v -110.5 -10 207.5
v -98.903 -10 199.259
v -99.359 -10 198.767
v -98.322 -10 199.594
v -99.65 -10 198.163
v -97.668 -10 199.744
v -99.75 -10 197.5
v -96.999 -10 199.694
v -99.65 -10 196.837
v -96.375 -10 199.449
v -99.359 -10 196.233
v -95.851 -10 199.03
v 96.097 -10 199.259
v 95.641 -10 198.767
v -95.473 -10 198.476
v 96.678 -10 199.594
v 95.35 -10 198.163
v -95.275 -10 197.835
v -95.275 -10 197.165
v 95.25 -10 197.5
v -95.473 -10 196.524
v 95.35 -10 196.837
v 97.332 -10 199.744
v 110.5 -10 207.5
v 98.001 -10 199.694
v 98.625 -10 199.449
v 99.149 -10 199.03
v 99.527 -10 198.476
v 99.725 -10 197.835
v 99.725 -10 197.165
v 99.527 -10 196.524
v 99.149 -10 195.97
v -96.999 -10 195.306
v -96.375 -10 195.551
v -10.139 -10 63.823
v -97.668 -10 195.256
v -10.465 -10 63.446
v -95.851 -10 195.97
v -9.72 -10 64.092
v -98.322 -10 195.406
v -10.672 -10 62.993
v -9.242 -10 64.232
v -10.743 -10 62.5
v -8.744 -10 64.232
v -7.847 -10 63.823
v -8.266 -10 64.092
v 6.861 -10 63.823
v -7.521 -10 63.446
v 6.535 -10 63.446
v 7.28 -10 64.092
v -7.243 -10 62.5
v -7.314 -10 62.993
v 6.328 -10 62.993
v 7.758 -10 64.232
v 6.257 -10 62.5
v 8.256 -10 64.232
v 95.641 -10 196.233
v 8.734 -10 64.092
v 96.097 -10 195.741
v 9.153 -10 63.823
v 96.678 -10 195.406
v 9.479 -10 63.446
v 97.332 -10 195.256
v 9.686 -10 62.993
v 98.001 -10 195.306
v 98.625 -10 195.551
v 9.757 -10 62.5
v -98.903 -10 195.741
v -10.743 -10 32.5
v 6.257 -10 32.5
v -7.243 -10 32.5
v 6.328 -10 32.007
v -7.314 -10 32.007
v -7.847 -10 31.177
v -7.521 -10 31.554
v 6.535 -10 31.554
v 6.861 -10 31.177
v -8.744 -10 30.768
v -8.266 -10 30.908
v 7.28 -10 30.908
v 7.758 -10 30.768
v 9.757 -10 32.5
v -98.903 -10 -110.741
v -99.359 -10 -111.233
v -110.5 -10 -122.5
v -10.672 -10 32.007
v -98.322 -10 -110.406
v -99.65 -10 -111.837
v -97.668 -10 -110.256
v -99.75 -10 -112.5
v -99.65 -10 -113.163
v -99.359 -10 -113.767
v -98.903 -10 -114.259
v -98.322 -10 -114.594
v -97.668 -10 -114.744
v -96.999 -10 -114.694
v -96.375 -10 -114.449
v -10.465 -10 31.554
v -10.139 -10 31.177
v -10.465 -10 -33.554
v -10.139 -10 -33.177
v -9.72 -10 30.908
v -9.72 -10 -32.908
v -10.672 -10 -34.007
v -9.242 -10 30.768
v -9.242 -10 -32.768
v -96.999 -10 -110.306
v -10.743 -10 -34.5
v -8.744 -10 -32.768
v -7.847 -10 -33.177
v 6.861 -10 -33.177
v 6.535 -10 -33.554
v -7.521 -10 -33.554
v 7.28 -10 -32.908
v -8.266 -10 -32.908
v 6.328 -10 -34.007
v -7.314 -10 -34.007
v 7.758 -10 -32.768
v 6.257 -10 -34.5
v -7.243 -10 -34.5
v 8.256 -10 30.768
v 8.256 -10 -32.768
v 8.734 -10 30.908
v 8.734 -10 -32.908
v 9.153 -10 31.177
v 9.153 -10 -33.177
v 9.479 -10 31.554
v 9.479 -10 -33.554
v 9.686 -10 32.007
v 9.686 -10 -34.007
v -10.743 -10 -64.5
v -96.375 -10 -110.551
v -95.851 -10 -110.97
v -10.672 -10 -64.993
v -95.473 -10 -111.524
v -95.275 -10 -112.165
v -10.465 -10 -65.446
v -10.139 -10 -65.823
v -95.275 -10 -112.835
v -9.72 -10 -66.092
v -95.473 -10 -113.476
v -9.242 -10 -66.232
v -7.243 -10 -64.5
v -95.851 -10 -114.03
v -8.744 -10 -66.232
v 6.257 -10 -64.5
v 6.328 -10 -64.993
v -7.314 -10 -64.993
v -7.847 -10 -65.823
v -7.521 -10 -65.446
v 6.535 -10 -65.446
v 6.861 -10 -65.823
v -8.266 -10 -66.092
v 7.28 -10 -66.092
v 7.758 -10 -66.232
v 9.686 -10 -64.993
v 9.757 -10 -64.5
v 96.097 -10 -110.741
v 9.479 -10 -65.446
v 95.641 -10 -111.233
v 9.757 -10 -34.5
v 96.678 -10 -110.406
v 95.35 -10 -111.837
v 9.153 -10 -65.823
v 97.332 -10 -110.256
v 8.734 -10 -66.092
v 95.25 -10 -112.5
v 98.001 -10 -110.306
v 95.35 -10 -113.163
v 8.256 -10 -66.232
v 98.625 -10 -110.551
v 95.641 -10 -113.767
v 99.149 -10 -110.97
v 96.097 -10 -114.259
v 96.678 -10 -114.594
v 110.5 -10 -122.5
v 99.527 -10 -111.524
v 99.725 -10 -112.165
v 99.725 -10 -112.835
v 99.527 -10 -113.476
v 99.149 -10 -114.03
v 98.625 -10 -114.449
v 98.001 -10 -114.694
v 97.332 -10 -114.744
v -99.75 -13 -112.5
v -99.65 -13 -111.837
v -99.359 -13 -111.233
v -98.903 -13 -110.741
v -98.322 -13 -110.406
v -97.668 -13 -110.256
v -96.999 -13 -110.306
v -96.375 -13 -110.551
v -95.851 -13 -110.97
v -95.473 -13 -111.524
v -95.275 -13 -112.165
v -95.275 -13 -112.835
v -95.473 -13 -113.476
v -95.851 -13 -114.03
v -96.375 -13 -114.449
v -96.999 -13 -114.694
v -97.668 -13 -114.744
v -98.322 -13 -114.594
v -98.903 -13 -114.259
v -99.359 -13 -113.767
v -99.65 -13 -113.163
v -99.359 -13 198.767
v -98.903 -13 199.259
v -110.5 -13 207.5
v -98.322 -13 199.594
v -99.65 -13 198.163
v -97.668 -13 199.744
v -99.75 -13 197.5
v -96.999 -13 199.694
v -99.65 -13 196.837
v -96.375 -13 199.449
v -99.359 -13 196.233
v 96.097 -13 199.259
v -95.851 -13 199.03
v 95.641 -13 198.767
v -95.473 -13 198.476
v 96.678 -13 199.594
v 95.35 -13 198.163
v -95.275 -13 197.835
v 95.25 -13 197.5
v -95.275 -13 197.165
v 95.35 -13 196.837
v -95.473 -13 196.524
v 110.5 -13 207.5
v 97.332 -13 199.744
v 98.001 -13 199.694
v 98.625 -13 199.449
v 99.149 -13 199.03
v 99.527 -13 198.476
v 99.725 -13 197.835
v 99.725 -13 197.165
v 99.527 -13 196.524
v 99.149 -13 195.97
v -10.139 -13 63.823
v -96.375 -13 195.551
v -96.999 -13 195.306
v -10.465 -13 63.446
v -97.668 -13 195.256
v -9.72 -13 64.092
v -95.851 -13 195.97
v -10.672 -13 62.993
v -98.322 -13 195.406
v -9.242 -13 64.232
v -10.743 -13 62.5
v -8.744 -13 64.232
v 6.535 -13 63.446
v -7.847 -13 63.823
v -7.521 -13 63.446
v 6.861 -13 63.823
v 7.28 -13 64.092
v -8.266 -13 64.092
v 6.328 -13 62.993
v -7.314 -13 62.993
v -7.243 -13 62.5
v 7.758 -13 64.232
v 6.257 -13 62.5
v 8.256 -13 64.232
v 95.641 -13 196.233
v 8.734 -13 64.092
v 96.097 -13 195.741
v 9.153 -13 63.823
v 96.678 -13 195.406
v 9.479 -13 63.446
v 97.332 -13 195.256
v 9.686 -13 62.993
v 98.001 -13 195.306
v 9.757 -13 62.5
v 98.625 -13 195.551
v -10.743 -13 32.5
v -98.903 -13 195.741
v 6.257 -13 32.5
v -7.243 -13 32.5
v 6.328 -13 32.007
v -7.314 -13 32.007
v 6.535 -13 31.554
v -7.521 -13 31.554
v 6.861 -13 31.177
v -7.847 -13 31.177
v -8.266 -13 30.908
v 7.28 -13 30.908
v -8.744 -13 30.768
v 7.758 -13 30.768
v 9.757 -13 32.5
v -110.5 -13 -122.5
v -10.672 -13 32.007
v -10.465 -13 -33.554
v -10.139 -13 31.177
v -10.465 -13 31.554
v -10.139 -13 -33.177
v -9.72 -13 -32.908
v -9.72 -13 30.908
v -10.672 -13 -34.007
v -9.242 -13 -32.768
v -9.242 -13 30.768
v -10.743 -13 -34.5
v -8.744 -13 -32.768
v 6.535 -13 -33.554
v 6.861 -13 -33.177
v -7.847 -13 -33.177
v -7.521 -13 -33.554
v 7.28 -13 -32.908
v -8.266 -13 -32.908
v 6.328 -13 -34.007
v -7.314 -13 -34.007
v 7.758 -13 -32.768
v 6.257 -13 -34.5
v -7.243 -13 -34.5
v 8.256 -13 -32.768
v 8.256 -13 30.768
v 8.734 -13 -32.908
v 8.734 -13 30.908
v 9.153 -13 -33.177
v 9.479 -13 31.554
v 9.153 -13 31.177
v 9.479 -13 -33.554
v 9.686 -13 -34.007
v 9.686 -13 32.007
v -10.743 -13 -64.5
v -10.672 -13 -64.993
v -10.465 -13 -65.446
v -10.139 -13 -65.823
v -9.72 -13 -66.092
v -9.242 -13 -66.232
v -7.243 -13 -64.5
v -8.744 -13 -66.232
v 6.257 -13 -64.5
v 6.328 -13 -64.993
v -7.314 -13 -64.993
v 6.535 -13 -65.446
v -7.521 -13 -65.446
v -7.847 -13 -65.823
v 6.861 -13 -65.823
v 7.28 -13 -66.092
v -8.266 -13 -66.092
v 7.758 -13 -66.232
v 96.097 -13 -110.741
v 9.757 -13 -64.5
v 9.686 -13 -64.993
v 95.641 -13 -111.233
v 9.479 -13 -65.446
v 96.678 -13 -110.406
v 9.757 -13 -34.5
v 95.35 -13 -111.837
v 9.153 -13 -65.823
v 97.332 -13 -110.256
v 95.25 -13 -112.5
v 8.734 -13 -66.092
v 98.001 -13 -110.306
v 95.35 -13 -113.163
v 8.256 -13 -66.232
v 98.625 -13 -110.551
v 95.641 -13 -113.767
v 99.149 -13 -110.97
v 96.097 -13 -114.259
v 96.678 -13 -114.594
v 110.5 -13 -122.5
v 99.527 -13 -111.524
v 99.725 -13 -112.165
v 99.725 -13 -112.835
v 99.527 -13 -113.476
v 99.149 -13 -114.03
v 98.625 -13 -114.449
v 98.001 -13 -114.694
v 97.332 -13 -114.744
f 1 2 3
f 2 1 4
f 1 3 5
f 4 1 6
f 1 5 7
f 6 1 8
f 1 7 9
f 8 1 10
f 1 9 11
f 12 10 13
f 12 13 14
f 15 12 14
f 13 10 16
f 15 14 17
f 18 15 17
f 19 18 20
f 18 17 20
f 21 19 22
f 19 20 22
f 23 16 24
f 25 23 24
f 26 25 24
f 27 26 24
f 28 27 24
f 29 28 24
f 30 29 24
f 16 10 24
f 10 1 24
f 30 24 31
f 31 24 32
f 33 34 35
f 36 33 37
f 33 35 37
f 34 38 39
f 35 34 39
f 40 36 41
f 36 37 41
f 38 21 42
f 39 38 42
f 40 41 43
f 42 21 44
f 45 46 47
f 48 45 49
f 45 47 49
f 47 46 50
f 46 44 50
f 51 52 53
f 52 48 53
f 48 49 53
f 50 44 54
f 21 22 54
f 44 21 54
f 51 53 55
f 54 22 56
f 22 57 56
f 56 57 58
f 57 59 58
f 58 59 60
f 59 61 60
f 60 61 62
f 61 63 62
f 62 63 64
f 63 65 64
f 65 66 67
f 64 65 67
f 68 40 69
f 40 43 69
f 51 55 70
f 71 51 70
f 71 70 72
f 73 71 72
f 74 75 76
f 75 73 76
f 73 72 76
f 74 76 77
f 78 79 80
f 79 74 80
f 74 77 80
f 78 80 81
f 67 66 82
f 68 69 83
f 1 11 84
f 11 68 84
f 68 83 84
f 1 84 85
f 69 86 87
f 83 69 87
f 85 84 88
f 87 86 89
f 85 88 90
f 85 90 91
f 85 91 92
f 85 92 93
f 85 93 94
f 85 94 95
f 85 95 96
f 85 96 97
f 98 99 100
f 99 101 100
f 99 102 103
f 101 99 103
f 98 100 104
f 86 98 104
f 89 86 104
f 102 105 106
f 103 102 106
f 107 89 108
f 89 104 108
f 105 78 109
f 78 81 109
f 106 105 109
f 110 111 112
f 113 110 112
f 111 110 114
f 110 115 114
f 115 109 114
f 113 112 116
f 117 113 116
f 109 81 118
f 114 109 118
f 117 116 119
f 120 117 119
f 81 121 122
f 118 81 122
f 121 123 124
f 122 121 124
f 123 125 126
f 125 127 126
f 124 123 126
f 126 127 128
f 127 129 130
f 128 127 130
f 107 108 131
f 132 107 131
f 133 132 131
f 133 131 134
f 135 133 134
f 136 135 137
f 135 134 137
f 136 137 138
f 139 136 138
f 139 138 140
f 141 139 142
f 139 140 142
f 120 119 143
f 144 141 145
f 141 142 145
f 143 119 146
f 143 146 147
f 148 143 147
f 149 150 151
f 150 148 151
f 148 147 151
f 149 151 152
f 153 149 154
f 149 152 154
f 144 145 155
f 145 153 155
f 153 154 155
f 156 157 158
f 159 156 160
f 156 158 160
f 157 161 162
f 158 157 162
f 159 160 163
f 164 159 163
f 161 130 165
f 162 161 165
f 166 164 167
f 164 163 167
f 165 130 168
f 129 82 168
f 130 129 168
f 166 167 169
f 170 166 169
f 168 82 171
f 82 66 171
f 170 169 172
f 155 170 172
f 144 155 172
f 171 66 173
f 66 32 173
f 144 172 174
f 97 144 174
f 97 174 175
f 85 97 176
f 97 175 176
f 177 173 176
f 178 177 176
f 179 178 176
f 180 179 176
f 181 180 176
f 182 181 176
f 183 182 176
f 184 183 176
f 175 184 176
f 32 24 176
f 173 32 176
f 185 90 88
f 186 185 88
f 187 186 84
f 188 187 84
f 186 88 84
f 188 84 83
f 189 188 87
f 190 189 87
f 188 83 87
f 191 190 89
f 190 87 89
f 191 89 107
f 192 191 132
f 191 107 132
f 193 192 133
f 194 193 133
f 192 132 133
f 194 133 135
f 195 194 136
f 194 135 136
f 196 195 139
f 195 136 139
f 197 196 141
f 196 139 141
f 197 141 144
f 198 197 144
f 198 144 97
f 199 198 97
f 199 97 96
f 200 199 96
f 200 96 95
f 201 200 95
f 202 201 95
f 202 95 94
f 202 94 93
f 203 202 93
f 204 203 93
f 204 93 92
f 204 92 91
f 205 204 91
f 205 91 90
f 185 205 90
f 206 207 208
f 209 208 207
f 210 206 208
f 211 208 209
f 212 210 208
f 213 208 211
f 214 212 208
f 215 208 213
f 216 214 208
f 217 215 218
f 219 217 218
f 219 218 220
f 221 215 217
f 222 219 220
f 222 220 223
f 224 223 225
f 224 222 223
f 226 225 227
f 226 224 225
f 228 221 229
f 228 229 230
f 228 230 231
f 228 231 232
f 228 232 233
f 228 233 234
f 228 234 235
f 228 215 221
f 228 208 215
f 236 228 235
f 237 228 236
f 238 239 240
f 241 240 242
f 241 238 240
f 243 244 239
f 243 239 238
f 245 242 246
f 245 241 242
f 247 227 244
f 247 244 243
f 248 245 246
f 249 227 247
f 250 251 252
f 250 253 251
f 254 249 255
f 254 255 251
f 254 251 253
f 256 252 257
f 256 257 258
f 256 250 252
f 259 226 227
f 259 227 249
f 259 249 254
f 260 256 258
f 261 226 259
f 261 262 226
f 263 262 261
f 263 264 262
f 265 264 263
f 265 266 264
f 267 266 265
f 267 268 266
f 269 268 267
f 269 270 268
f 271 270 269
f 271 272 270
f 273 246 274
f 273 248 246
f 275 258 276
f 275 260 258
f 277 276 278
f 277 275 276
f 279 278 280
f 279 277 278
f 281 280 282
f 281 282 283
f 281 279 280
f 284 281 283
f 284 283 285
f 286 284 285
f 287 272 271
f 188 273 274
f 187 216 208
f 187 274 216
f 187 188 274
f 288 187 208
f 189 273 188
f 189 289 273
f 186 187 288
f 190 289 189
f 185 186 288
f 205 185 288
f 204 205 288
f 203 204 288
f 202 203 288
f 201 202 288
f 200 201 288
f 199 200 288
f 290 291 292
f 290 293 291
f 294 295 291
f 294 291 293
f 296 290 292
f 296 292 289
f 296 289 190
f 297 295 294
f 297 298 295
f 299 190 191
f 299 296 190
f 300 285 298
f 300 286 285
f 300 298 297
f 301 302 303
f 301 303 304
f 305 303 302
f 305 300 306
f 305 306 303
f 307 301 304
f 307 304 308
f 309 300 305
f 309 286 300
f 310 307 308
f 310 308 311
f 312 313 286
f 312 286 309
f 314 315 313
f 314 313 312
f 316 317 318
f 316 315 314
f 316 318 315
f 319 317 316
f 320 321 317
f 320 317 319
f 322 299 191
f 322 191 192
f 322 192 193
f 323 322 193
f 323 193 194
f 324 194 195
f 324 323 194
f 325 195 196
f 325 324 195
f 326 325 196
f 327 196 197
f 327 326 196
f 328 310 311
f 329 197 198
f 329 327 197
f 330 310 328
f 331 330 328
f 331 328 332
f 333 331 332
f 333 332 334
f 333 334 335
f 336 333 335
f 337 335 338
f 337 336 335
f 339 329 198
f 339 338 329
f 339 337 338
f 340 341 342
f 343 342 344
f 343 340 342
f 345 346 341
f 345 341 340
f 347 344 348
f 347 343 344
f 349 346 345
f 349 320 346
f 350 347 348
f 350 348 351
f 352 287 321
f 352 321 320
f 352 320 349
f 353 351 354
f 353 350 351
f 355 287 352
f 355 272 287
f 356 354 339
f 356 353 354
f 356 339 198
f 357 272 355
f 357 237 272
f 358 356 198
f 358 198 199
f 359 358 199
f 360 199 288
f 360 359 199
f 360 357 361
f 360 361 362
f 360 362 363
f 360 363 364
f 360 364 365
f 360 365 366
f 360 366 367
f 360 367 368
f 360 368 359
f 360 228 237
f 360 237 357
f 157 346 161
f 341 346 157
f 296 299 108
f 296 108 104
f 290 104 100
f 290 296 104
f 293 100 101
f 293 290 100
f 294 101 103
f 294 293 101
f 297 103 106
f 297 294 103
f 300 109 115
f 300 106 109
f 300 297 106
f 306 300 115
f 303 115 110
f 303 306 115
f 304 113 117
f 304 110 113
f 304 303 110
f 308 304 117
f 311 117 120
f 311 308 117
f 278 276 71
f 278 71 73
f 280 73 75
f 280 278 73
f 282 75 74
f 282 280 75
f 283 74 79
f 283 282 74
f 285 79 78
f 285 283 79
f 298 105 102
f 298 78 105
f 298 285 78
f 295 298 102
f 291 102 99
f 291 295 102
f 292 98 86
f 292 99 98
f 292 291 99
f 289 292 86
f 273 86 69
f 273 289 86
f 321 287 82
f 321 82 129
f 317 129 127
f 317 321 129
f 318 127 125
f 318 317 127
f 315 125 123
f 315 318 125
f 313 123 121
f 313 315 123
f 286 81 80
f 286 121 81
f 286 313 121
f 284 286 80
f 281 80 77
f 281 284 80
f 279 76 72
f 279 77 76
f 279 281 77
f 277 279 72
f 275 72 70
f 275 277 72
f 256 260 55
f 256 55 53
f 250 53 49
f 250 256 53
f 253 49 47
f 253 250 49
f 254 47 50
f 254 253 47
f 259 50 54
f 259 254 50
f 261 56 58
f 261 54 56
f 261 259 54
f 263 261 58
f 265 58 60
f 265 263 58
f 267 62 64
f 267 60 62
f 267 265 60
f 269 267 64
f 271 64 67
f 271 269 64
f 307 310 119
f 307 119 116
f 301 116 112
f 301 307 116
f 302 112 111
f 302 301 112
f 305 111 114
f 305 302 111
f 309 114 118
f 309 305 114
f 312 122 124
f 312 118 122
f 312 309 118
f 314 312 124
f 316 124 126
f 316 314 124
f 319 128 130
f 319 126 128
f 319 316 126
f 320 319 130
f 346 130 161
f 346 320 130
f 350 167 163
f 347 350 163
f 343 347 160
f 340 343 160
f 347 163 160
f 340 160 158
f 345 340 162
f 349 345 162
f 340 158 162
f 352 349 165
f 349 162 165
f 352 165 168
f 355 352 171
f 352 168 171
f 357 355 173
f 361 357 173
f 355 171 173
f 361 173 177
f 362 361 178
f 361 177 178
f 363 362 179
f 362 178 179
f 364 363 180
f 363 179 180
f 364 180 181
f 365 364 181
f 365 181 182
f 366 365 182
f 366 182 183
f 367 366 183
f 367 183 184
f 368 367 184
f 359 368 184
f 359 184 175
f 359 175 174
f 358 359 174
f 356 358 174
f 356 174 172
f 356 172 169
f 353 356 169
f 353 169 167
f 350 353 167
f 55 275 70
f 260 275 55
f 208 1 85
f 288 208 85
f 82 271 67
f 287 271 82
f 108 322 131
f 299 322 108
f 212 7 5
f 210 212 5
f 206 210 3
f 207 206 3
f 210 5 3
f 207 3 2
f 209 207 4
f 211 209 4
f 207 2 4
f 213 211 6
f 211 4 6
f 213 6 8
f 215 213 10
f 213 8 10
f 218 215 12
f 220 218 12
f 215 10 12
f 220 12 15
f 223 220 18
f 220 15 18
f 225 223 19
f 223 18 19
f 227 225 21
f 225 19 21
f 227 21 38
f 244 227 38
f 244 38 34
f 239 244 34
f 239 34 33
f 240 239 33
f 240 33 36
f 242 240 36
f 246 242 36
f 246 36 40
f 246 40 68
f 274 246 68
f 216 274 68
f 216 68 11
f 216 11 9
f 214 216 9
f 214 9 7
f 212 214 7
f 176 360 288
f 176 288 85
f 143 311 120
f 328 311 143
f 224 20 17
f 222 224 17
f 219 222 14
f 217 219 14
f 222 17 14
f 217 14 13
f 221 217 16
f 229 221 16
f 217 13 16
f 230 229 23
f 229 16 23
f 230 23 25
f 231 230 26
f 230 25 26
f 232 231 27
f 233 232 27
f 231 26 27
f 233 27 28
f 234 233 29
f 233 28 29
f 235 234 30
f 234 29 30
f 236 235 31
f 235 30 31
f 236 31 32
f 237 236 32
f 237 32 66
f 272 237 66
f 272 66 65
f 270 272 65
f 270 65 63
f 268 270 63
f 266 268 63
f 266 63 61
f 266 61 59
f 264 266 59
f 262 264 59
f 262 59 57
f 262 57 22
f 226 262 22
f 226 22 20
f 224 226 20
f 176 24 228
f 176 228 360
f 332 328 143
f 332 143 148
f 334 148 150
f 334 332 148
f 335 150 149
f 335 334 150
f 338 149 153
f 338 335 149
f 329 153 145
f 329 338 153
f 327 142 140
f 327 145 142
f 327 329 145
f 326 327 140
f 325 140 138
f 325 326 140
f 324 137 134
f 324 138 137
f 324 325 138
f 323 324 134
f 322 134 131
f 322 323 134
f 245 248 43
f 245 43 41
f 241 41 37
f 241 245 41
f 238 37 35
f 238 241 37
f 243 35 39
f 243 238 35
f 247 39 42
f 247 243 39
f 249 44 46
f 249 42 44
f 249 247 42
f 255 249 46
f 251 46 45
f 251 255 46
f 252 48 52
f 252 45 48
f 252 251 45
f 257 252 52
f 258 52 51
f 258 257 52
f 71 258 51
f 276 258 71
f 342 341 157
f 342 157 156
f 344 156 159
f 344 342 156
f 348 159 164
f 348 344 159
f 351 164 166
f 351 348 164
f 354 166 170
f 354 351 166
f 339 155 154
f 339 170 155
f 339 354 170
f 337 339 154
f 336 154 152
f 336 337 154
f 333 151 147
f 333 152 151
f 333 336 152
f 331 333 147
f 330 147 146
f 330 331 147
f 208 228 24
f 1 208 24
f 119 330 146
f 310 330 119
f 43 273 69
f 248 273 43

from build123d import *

# Parameters (mm, degrees)
SKETCH1_W                = 330
SKETCH1_H                = 3
EXTRUDE_THIN1_DEPTH      = 110.5
EXTRUDE_THIN1_DEPTH_BACK = 110.5
CUT_EXTRUDE1_REACH       = 5
SKETCH2_R                = 2.1
M4_CLEARANCE_HOLE1_D     = 4.5


with BuildPart() as part:
    # Sketch1 → Extrude-Thin1 (new body, two sides)
    with BuildSketch(Plane(origin=(0, 0, 0), x_dir=(0, 0, -1), z_dir=(1, 0, 0))) as extrude_thin1_sk:
        with Locations((-42.5, -11.5)):
            Rectangle(SKETCH1_W, SKETCH1_H)
    extrude(amount=EXTRUDE_THIN1_DEPTH)
    extrude(extrude_thin1_sk.sketch, amount=-EXTRUDE_THIN1_DEPTH_BACK)

    # Sketch2 → Cut-Extrude1 (cut, up to next)
    with BuildSketch(Plane.XZ.offset(13), mode=Mode.PRIVATE) as cut_extrude1_sk1:
        with Locations((97.5, -112.5)):
            Circle(SKETCH2_R)
    cut_extrude1_tool1 = extrude(cut_extrude1_sk1.sketch, amount=-CUT_EXTRUDE1_REACH, mode=Mode.PRIVATE) & part.part
    add(cut_extrude1_tool1.solids().sort_by_distance((97.5, -13, -112.5))[0], mode=Mode.SUBTRACT)
    # Sketch2 → Cut-Extrude1 (cut, up to next)
    with BuildSketch(Plane.XZ.offset(13), mode=Mode.PRIVATE) as cut_extrude1_sk2:
        with Locations((-97.5, -112.5)):
            Circle(SKETCH2_R)
    cut_extrude1_tool2 = extrude(cut_extrude1_sk2.sketch, amount=-CUT_EXTRUDE1_REACH, mode=Mode.PRIVATE) & part.part
    add(cut_extrude1_tool2.solids().sort_by_distance((-97.5, -13, -112.5))[0], mode=Mode.SUBTRACT)
    # Sketch2 → Cut-Extrude1 (cut, up to next)
    with BuildSketch(Plane.XZ.offset(13), mode=Mode.PRIVATE) as cut_extrude1_sk3:
        with Locations((97.5, 197.5)):
            Circle(SKETCH2_R)
    cut_extrude1_tool3 = extrude(cut_extrude1_sk3.sketch, amount=-CUT_EXTRUDE1_REACH, mode=Mode.PRIVATE) & part.part
    add(cut_extrude1_tool3.solids().sort_by_distance((97.5, -13, 197.5))[0], mode=Mode.SUBTRACT)
    # Sketch2 → Cut-Extrude1 (cut, up to next)
    with BuildSketch(Plane.XZ.offset(13), mode=Mode.PRIVATE) as cut_extrude1_sk4:
        with Locations((-97.5, 197.5)):
            Circle(SKETCH2_R)
    cut_extrude1_tool4 = extrude(cut_extrude1_sk4.sketch, amount=-CUT_EXTRUDE1_REACH, mode=Mode.PRIVATE) & part.part
    add(cut_extrude1_tool4.solids().sort_by_distance((-97.5, -13, 197.5))[0], mode=Mode.SUBTRACT)
    # Sketch2 → Cut-Extrude1 (cut, up to next)
    with BuildSketch(Plane.XZ.offset(13), mode=Mode.PRIVATE) as cut_extrude1_sk5:
        with BuildLine():
            Line((-7.243170513, -34.5), (-7.243170513, -64.5))
            ThreePointArc((-7.243170513, -64.5), (-8.993170513, -66.25), (-10.743170513, -64.5))
            Line((-10.743170513, -64.5), (-10.743170513, -34.5))
            ThreePointArc((-10.743170513, -34.5), (-8.993170513, -32.75), (-7.243170513, -34.5))
        make_face()
    cut_extrude1_tool5 = extrude(cut_extrude1_sk5.sketch, amount=-CUT_EXTRUDE1_REACH, mode=Mode.PRIVATE) & part.part
    add(cut_extrude1_tool5.solids().sort_by_distance((-8.993171, -13, -49.5))[0], mode=Mode.SUBTRACT)
    # Sketch2 → Cut-Extrude1 (cut, up to next)
    with BuildSketch(Plane.XZ.offset(13), mode=Mode.PRIVATE) as cut_extrude1_sk6:
        with BuildLine():
            Line((9.756829487, -34.5), (9.756829487, -64.5))
            ThreePointArc((9.756829487, -64.5), (8.006829487, -66.25), (6.256829487, -64.5))
            Line((6.256829487, -64.5), (6.256829487, -34.5))
            ThreePointArc((6.256829487, -34.5), (8.006829487, -32.75), (9.756829487, -34.5))
        make_face()
    cut_extrude1_tool6 = extrude(cut_extrude1_sk6.sketch, amount=-CUT_EXTRUDE1_REACH, mode=Mode.PRIVATE) & part.part
    add(cut_extrude1_tool6.solids().sort_by_distance((8.006829, -13, -49.5))[0], mode=Mode.SUBTRACT)
    # Sketch2 → Cut-Extrude1 (cut, up to next)
    with BuildSketch(Plane.XZ.offset(13), mode=Mode.PRIVATE) as cut_extrude1_sk7:
        with BuildLine():
            Line((9.756829487, 62.5), (9.756829487, 32.5))
            ThreePointArc((9.756829487, 32.5), (8.006829487, 30.75), (6.256829487, 32.5))
            Line((6.256829487, 32.5), (6.256829487, 62.5))
            ThreePointArc((6.256829487, 62.5), (8.006829487, 64.25), (9.756829487, 62.5))
        make_face()
    cut_extrude1_tool7 = extrude(cut_extrude1_sk7.sketch, amount=-CUT_EXTRUDE1_REACH, mode=Mode.PRIVATE) & part.part
    add(cut_extrude1_tool7.solids().sort_by_distance((8.006829, -13, 47.5))[0], mode=Mode.SUBTRACT)
    # Sketch2 → Cut-Extrude1 (cut, up to next)
    with BuildSketch(Plane.XZ.offset(13), mode=Mode.PRIVATE) as cut_extrude1_sk8:
        with BuildLine():
            Line((-7.243170513, 62.5), (-7.243170513, 32.5))
            ThreePointArc((-7.243170513, 32.5), (-8.993170513, 30.75), (-10.743170513, 32.5))
            Line((-10.743170513, 32.5), (-10.743170513, 62.5))
            ThreePointArc((-10.743170513, 62.5), (-8.993170513, 64.25), (-7.243170513, 62.5))
        make_face()
    cut_extrude1_tool8 = extrude(cut_extrude1_sk8.sketch, amount=-CUT_EXTRUDE1_REACH, mode=Mode.PRIVATE) & part.part
    add(cut_extrude1_tool8.solids().sort_by_distance((-8.993171, -13, 47.5))[0], mode=Mode.SUBTRACT)

    # M4 Clearance Hole1 (through all)
    with Locations(Plane.XZ.offset(13)):
        with Locations((-97.5, 197.5), (97.5, 197.5), (97.5, -112.5), (-97.5, -112.5)):
            Hole(M4_CLEARANCE_HOLE1_D / 2)


solid = part.part
